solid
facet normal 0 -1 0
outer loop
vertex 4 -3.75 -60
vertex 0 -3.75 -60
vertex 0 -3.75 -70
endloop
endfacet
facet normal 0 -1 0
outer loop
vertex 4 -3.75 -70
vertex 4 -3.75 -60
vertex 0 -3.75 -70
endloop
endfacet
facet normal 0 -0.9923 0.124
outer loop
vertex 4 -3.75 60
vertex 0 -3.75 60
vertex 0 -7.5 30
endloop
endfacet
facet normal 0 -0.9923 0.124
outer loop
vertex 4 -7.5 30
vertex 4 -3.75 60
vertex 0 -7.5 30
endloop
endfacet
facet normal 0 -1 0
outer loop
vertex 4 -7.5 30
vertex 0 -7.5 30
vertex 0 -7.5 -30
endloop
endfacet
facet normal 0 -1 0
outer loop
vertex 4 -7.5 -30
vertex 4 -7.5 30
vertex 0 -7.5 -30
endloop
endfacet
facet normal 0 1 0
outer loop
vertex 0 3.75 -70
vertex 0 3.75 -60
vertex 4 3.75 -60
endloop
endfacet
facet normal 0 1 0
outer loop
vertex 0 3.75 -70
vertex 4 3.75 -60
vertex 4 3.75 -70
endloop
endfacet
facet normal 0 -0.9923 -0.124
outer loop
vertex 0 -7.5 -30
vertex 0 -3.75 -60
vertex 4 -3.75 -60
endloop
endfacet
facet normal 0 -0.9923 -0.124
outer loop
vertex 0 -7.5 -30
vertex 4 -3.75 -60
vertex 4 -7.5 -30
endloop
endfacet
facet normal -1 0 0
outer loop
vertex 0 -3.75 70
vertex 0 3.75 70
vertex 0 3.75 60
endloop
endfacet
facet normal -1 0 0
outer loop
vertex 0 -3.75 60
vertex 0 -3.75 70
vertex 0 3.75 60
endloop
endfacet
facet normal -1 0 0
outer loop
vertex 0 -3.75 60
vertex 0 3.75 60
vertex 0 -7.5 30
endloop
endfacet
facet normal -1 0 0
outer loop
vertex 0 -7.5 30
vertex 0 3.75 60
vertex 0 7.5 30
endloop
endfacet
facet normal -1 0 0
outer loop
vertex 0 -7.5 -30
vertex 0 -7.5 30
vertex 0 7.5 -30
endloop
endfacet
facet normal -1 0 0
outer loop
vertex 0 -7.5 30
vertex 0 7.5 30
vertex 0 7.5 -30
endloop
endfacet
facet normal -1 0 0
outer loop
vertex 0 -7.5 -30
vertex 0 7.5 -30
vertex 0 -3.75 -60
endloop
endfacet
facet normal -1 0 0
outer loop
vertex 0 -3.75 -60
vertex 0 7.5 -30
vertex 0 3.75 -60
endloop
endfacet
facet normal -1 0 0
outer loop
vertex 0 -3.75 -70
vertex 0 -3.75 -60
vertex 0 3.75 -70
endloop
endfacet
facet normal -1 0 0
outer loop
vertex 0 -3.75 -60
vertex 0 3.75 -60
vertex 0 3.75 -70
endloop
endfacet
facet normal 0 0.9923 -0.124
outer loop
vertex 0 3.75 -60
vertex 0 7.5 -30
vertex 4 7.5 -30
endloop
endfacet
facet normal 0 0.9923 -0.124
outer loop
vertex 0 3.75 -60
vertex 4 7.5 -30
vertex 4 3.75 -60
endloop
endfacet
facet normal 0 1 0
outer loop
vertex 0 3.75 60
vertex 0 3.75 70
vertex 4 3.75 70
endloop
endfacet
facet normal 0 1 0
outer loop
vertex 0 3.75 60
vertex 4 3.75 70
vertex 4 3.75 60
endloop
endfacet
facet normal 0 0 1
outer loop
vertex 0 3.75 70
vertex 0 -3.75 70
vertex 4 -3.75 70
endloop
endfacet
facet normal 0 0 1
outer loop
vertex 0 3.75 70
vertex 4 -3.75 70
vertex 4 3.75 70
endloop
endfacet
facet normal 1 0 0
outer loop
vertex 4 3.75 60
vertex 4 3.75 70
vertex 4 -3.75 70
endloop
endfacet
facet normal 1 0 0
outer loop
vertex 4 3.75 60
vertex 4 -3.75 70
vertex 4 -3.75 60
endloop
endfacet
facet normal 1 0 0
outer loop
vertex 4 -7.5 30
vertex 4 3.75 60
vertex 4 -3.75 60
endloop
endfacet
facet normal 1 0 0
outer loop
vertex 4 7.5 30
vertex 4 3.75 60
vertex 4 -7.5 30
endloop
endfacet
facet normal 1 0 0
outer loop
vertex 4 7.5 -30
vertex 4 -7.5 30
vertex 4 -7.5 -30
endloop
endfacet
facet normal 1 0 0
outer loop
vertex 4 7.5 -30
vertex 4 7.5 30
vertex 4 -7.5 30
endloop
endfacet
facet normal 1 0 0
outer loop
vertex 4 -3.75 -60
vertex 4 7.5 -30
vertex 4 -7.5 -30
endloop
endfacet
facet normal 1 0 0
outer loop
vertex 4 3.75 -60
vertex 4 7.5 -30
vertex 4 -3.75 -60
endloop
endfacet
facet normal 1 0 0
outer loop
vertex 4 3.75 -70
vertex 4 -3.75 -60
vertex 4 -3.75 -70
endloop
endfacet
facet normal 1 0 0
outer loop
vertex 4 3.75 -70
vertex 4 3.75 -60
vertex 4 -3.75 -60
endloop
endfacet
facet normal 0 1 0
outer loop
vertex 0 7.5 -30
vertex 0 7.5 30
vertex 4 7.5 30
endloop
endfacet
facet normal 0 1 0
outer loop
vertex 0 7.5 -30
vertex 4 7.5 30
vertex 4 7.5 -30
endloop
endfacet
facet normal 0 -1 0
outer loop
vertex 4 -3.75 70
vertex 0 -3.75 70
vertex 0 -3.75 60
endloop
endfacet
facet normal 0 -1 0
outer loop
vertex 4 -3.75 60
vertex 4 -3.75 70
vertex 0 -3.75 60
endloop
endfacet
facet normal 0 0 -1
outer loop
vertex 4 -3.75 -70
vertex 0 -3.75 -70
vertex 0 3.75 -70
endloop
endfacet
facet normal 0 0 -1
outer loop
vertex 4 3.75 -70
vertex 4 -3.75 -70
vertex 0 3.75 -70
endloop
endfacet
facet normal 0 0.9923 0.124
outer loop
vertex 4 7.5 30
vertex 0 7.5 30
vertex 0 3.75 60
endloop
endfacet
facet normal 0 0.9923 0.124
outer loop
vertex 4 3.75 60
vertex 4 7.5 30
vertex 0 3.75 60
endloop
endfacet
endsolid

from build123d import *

# Parameters (mm, degrees)
SKETCH_1_W      = 60
SKETCH_1_H      = 15
SKETCH_1_W_2    = 10
SKETCH_1_H_2    = 7.5
EXTRUDE_1_DEPTH = 4


with BuildPart() as part:
    # Эскиз1 → Бобышка-Вытянуть1 (new body)
    with BuildSketch(Plane(origin=(0, 0, 0), x_dir=(0, 0, -1), z_dir=(1, 0, 0))):
        Rectangle(SKETCH_1_W, SKETCH_1_H)
        Polygon((-30, -7.5), (-30, 7.5), (-60, 3.75), (-60, -3.75), align=None)
        with Locations((-65, 0)):
            Rectangle(SKETCH_1_W_2, SKETCH_1_H_2)
        Polygon((60, -3.75), (30, -7.5), (30, 7.5), (60, 3.75), align=None)
        with Locations((65, 0)):
            Rectangle(SKETCH_1_W_2, SKETCH_1_H_2)
    extrude(amount=EXTRUDE_1_DEPTH)


solid = part.part
